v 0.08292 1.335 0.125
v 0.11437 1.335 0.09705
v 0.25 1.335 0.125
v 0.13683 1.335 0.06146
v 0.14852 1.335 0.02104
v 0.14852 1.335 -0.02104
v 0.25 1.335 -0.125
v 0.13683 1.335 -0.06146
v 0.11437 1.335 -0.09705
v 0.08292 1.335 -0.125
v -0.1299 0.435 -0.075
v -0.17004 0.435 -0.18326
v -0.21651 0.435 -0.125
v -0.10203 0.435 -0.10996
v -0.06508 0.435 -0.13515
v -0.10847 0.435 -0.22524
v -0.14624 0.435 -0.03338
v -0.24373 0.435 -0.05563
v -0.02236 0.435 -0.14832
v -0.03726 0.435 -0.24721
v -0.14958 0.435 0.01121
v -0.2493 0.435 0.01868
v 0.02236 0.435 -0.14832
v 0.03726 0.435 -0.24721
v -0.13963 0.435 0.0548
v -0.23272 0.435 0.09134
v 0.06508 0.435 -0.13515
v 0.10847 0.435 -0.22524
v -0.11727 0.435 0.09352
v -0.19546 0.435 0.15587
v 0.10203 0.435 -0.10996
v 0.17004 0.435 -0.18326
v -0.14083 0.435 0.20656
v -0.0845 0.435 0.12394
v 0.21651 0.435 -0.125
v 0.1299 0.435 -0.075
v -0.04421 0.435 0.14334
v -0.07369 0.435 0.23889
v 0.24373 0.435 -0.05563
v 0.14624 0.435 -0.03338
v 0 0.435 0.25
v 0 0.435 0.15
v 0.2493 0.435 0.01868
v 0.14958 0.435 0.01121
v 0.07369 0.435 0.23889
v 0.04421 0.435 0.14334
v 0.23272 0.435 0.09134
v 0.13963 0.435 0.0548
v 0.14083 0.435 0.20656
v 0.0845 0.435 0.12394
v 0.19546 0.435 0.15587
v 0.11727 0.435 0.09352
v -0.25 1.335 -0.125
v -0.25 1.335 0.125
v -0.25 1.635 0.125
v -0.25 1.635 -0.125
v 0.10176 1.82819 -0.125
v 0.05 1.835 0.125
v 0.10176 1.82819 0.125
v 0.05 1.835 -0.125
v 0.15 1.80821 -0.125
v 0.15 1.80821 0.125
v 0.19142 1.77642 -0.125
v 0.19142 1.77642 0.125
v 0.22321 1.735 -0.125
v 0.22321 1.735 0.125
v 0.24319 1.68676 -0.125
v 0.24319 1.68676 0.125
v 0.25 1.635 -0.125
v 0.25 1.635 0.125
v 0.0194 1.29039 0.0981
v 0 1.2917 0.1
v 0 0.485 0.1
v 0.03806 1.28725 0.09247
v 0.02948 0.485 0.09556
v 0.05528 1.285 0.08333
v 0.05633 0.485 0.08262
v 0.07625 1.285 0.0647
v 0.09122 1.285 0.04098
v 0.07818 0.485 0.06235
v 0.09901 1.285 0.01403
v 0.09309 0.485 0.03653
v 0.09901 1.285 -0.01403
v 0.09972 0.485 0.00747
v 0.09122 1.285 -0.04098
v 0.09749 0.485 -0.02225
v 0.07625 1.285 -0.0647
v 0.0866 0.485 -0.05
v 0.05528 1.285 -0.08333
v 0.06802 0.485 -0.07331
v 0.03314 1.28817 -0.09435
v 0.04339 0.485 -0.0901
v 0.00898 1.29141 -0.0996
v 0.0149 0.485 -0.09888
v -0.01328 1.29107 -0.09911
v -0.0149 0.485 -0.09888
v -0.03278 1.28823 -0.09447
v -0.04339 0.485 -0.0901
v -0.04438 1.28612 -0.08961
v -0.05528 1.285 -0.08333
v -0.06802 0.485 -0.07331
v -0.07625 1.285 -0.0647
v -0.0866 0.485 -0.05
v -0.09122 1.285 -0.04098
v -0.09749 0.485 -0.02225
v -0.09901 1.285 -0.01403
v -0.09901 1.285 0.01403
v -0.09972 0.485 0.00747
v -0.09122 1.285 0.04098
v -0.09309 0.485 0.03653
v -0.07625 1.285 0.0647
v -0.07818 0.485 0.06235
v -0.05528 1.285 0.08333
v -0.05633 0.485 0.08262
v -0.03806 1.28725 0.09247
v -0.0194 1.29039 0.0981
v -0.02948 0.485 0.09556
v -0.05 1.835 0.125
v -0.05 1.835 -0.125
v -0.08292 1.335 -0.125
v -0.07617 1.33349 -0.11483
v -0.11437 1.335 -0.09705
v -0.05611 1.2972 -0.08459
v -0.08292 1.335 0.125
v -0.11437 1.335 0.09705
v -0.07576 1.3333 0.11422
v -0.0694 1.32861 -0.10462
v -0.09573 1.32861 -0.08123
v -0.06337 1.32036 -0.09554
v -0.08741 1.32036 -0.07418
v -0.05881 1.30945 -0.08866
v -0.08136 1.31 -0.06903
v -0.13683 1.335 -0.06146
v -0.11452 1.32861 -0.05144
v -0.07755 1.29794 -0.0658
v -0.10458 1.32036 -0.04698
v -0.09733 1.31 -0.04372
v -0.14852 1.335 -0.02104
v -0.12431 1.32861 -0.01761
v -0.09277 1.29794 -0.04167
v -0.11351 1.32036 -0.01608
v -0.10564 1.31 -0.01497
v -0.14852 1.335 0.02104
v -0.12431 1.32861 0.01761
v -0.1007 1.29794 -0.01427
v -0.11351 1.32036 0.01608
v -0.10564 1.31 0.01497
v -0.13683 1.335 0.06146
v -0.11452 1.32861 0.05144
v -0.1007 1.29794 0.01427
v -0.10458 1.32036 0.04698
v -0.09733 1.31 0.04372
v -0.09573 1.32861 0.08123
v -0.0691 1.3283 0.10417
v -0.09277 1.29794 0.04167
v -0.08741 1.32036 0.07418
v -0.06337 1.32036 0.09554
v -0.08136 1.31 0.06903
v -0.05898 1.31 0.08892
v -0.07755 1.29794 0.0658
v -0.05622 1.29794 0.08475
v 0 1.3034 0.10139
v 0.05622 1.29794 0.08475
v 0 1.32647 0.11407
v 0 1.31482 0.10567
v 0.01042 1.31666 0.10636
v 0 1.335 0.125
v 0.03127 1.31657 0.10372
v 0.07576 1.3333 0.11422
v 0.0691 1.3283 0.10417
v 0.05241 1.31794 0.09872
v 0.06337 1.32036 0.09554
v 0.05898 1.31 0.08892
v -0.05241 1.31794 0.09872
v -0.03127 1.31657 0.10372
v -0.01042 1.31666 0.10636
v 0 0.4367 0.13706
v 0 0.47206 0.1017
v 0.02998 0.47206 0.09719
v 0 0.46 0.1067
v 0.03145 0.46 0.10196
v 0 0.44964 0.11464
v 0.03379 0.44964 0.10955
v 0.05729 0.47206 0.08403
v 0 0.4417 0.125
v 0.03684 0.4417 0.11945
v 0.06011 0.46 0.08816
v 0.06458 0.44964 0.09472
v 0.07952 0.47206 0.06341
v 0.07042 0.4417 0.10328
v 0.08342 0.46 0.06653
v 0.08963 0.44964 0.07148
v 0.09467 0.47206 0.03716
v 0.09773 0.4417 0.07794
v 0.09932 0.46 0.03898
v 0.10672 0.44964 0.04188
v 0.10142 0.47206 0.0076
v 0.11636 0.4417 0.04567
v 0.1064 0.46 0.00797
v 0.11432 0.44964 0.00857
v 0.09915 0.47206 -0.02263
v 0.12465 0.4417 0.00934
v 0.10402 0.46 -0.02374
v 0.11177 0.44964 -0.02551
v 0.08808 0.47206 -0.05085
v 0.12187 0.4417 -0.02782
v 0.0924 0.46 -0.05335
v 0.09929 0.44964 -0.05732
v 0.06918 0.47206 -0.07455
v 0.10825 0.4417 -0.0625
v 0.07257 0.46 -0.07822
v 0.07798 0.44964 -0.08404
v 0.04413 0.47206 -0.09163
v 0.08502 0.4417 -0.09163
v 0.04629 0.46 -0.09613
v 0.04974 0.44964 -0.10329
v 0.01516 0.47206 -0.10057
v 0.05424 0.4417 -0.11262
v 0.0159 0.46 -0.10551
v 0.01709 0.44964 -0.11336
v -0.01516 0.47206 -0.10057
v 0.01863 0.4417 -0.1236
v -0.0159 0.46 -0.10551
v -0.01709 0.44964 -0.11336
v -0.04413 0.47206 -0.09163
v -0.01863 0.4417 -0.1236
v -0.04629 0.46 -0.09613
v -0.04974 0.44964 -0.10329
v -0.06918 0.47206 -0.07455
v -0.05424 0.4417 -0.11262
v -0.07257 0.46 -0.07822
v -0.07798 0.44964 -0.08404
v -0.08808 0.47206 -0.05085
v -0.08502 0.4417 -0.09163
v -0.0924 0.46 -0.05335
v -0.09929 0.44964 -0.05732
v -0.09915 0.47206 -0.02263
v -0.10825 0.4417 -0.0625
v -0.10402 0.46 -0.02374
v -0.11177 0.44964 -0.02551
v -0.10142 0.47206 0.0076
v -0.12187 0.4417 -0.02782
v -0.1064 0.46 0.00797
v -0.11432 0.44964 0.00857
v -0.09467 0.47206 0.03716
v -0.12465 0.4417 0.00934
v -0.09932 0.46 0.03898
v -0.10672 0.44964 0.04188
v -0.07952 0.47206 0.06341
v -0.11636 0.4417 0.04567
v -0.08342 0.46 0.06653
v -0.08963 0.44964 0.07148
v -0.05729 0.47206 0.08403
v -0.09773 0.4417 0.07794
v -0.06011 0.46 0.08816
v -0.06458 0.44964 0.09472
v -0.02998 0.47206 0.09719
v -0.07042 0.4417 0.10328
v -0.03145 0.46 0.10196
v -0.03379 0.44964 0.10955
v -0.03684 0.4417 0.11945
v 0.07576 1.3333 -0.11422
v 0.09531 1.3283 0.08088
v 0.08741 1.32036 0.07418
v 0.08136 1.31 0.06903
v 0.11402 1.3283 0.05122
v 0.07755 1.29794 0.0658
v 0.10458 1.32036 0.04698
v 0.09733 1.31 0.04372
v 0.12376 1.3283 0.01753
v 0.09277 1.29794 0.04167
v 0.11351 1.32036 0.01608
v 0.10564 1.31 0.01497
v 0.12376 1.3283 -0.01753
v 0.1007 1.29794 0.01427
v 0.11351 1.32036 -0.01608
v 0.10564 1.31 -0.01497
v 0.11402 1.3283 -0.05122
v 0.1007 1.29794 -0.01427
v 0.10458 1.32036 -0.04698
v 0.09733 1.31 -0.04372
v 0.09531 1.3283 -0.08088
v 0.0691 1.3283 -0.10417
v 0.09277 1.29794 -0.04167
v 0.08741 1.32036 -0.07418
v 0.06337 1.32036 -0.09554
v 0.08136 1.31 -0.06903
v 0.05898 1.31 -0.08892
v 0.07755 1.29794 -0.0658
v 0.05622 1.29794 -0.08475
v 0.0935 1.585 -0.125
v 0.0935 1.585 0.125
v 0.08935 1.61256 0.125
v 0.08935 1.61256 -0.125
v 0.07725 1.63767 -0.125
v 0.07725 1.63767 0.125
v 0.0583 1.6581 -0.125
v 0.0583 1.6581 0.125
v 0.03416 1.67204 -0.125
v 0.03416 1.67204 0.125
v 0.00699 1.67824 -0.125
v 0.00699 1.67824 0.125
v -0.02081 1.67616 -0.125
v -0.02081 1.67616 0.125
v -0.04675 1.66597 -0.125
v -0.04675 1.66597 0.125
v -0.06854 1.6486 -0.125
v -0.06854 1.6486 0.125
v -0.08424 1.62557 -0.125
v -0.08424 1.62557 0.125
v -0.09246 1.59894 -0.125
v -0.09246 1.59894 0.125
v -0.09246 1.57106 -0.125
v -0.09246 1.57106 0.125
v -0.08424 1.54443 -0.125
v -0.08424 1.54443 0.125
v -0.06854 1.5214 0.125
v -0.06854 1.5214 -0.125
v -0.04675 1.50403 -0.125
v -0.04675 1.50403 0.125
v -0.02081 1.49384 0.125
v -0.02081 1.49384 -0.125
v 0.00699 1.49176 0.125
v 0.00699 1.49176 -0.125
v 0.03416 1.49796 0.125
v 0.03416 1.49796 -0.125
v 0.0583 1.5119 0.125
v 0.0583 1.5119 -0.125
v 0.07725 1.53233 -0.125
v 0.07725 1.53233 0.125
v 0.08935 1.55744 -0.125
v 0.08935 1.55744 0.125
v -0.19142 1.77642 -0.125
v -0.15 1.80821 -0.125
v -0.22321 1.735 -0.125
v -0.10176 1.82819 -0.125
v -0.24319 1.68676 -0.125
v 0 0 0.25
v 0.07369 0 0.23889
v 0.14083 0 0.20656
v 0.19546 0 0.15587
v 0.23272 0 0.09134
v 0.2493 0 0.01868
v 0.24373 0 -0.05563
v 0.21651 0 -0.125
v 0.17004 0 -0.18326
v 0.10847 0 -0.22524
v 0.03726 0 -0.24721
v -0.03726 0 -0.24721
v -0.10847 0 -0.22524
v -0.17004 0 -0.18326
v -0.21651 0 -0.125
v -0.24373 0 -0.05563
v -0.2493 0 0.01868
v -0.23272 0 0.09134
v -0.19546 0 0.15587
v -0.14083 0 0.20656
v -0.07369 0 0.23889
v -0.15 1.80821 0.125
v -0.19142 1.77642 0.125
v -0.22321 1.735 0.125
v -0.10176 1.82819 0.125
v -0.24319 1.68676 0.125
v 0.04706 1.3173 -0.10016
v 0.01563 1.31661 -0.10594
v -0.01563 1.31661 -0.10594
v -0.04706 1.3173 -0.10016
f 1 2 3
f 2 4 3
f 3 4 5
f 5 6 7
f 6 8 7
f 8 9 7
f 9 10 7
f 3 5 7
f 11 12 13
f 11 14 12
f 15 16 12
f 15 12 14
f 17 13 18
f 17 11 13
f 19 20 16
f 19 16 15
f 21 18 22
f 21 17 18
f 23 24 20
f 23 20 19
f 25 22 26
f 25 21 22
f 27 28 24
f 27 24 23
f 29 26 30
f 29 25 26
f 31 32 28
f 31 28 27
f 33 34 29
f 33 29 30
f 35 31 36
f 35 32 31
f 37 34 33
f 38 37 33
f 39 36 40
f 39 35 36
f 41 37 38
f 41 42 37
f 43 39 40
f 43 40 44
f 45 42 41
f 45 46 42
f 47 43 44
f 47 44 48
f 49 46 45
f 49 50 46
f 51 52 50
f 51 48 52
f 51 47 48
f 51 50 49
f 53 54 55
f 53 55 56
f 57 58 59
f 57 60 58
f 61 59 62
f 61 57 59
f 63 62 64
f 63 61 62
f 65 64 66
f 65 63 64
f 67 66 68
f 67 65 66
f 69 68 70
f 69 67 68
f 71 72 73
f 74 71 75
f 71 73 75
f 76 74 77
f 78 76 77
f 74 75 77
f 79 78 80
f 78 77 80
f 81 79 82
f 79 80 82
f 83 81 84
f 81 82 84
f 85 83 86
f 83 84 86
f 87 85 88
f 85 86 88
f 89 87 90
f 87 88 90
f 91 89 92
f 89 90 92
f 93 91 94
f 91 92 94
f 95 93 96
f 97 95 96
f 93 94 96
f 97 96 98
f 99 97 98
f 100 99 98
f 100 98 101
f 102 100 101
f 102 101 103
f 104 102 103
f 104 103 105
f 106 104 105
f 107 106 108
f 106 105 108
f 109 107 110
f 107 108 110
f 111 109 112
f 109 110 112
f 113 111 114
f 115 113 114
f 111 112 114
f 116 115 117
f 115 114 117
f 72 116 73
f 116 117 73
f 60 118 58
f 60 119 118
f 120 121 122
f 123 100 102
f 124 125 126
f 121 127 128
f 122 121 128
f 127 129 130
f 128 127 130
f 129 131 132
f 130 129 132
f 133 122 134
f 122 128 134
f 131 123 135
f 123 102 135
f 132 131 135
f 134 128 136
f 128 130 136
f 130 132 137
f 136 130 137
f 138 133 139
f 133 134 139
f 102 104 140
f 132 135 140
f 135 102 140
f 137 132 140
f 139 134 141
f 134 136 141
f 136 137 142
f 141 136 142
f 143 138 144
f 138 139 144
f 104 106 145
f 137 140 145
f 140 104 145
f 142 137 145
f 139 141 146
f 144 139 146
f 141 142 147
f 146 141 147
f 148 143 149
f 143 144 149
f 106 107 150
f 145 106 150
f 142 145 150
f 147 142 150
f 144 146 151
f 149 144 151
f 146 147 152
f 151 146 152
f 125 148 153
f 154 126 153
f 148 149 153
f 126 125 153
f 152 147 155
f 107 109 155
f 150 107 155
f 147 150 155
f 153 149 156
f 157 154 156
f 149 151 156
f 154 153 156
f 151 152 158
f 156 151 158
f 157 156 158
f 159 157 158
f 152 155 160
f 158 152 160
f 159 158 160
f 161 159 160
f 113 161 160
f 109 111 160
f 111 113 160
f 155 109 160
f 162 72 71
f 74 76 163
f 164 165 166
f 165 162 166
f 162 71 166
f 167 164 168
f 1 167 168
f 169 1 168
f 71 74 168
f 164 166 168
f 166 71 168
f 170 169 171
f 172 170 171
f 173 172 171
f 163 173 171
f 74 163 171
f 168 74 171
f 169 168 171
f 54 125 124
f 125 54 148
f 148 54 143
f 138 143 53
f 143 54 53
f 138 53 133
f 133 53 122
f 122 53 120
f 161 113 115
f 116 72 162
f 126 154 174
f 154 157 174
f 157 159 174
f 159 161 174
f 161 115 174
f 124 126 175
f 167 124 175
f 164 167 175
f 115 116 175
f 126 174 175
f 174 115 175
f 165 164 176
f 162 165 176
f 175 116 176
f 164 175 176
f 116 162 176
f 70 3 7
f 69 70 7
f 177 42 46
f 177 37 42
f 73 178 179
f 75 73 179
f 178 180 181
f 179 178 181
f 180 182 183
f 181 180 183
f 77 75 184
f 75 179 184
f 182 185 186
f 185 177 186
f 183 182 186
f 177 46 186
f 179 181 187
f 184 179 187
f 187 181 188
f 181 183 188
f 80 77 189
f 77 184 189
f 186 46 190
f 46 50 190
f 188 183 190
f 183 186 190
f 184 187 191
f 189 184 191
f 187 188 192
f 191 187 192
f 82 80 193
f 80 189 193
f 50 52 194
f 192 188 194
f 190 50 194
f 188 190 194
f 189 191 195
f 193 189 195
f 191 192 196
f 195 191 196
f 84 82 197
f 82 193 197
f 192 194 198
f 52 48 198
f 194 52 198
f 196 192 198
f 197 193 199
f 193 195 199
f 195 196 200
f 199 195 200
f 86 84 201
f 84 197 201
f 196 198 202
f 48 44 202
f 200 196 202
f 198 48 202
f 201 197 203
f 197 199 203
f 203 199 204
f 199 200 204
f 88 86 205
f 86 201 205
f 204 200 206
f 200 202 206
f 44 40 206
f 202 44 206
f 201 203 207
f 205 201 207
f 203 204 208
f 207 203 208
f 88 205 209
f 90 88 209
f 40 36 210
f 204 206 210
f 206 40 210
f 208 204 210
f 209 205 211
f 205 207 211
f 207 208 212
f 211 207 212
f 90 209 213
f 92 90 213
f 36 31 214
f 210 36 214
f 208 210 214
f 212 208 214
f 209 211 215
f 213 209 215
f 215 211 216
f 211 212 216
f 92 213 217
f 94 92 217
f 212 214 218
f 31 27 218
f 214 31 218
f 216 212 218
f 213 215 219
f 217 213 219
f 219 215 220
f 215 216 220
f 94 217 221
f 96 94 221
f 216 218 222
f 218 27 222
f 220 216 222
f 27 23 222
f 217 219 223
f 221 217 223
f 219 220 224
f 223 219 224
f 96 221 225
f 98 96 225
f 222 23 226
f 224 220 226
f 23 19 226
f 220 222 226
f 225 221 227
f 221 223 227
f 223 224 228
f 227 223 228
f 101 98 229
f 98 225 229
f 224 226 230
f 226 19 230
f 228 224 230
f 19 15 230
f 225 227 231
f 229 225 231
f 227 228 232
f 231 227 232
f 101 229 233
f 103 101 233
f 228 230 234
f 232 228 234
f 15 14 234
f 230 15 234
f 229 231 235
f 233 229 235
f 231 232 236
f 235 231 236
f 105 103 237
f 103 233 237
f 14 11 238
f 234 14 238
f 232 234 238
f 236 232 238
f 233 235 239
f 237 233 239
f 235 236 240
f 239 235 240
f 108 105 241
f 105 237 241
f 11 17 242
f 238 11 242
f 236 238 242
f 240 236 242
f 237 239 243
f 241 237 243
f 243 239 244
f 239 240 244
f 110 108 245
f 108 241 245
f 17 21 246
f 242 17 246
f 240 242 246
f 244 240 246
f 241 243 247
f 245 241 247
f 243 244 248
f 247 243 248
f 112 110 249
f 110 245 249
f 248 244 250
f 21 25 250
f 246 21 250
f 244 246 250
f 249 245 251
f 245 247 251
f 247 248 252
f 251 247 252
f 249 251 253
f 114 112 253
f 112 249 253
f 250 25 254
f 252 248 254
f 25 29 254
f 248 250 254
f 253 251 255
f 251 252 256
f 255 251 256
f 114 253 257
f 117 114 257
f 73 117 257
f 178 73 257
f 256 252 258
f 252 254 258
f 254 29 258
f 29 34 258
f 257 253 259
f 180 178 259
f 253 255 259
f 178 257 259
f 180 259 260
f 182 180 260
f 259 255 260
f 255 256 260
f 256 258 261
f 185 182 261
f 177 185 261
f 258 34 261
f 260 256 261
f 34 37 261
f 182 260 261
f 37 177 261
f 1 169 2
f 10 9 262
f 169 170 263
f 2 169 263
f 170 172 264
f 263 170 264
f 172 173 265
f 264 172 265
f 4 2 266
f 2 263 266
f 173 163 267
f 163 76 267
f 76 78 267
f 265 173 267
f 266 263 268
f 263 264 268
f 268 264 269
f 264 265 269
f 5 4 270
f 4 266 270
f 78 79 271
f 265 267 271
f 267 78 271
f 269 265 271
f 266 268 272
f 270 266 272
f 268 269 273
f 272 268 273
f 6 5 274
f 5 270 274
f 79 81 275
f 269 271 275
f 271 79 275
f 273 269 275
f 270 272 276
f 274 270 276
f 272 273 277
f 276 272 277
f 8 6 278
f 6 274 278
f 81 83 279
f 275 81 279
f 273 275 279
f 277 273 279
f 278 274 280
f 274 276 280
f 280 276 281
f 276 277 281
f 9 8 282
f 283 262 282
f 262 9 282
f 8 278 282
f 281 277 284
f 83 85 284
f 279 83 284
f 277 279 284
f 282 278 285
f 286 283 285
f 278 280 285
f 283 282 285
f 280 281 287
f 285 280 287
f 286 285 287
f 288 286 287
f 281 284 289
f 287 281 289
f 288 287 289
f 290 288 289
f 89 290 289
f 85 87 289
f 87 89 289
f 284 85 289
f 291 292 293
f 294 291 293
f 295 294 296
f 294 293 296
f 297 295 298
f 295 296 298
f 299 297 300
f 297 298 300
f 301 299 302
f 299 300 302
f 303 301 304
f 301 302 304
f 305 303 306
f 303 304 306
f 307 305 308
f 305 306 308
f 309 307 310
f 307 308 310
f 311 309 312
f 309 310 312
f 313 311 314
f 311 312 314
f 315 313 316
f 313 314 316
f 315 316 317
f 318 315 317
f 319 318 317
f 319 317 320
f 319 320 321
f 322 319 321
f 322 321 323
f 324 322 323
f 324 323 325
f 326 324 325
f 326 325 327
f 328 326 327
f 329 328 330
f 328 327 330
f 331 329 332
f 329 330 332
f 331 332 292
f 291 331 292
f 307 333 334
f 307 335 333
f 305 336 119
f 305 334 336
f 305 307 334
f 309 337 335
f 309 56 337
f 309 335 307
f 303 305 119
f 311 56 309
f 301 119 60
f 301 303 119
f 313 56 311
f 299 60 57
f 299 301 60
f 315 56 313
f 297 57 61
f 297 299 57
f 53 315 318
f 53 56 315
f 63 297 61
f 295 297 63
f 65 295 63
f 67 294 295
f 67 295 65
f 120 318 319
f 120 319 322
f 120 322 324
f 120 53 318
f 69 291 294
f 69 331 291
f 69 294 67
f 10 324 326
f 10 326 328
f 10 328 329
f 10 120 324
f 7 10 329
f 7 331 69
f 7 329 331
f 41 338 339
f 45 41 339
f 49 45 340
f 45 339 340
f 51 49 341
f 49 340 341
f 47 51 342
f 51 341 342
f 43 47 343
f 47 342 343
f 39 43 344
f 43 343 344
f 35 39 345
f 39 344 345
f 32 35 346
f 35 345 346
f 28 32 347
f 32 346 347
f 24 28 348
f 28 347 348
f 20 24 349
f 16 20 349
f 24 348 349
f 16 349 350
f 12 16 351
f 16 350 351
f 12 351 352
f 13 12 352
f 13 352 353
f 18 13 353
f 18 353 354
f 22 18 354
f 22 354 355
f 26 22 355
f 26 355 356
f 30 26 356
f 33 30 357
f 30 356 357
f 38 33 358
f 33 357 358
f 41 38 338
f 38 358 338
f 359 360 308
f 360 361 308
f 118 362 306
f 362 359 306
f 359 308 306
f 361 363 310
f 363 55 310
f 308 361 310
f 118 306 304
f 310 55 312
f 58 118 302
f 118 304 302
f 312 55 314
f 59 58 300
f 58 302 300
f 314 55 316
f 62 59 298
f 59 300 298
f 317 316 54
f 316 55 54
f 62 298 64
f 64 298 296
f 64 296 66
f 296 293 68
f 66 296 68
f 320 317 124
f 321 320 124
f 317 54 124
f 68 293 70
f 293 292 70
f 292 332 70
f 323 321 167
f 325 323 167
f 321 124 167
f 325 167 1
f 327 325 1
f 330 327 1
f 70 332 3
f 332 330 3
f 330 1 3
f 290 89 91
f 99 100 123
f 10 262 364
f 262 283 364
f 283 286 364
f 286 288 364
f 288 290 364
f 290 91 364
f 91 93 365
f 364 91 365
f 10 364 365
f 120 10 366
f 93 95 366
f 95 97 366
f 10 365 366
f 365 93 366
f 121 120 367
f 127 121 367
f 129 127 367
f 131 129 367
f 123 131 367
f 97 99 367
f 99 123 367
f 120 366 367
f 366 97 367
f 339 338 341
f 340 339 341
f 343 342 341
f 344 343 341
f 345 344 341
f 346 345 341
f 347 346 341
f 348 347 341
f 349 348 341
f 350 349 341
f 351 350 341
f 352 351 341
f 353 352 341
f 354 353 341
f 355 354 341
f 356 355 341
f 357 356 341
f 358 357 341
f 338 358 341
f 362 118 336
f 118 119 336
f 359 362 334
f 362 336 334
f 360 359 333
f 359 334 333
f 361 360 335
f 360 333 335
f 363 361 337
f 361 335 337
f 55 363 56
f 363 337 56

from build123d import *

# Parameters (mm, degrees)
SKETCH1_R           = 0.25
BOSS_EXTRUDE1_DEPTH = 0.435
SKETCH2_R           = 0.1
BOSS_EXTRUDE2_DEPTH = 0.9
SKETCH3_W           = 0.5
SKETCH3_H           = 0.25
BOSS_EXTRUDE3_DEPTH = 0.5
FILLET1_R           = 0.2
FILLET2_R           = 0.2
SKETCH5_R           = 0.0935
CUT_EXTRUDE1_DEPTH  = 0.25
FILLET3_R           = 0.05
FILLET4_R           = 0.05


with BuildPart() as part:
    # Sketch1 → Boss-Extrude1 (new body)
    with BuildSketch(Plane(origin=(0, 0, 0), x_dir=(1, 0, 0), z_dir=(0, 1, 0))):
        with Locations(Location((0, 0, 0), (0, 0, 270))):
            Circle(SKETCH1_R)
    extrude(amount=BOSS_EXTRUDE1_DEPTH)

    # Sketch2 → Boss-Extrude2 (add)
    with BuildSketch(Plane(origin=(0, 0.435, 0), x_dir=(1, 0, 0), z_dir=(0, 1, 0))):
        with Locations(Location((0, 0, 0), (0, 0, 270))):
            Circle(SKETCH2_R)
    extrude(amount=BOSS_EXTRUDE2_DEPTH)

    # Sketch3 → Boss-Extrude3 (add)
    with BuildSketch(Plane(origin=(0, 1.335, 0), x_dir=(1, 0, 0), z_dir=(0, 1, 0))):
        Rectangle(SKETCH3_W, SKETCH3_H)
    extrude(amount=BOSS_EXTRUDE3_DEPTH)

    # Fillet1
    fillet1_edges = [part.edges().sort_by_distance(p)[0] for p in [
        (0.25, 1.835, 0),
    ]]
    fillet(fillet1_edges, radius=FILLET1_R)

    # Fillet2
    fillet2_edges = [part.edges().sort_by_distance(p)[0] for p in [
        (-0.25, 1.835, 0),
    ]]
    fillet(fillet2_edges, radius=FILLET2_R)

    # Sketch5 → Cut-Extrude1 (cut)
    with BuildSketch(Plane.XY.offset(0.125)):
        with Locations((0, 1.585)):
            Circle(SKETCH5_R)
    extrude(amount=-CUT_EXTRUDE1_DEPTH, mode=Mode.SUBTRACT)

    # Fillet3
    fillet3_edges = [part.edges().sort_by_distance(p)[0] for p in [
        (0, 1.335, -0.1),
    ]]
    fillet(fillet3_edges, radius=FILLET3_R)

    # Fillet4
    fillet4_edges = [part.edges().sort_by_distance(p)[0] for p in [
        (0, 0.435, -0.1),
    ]]
    fillet(fillet4_edges, radius=FILLET4_R)


solid = part.part
